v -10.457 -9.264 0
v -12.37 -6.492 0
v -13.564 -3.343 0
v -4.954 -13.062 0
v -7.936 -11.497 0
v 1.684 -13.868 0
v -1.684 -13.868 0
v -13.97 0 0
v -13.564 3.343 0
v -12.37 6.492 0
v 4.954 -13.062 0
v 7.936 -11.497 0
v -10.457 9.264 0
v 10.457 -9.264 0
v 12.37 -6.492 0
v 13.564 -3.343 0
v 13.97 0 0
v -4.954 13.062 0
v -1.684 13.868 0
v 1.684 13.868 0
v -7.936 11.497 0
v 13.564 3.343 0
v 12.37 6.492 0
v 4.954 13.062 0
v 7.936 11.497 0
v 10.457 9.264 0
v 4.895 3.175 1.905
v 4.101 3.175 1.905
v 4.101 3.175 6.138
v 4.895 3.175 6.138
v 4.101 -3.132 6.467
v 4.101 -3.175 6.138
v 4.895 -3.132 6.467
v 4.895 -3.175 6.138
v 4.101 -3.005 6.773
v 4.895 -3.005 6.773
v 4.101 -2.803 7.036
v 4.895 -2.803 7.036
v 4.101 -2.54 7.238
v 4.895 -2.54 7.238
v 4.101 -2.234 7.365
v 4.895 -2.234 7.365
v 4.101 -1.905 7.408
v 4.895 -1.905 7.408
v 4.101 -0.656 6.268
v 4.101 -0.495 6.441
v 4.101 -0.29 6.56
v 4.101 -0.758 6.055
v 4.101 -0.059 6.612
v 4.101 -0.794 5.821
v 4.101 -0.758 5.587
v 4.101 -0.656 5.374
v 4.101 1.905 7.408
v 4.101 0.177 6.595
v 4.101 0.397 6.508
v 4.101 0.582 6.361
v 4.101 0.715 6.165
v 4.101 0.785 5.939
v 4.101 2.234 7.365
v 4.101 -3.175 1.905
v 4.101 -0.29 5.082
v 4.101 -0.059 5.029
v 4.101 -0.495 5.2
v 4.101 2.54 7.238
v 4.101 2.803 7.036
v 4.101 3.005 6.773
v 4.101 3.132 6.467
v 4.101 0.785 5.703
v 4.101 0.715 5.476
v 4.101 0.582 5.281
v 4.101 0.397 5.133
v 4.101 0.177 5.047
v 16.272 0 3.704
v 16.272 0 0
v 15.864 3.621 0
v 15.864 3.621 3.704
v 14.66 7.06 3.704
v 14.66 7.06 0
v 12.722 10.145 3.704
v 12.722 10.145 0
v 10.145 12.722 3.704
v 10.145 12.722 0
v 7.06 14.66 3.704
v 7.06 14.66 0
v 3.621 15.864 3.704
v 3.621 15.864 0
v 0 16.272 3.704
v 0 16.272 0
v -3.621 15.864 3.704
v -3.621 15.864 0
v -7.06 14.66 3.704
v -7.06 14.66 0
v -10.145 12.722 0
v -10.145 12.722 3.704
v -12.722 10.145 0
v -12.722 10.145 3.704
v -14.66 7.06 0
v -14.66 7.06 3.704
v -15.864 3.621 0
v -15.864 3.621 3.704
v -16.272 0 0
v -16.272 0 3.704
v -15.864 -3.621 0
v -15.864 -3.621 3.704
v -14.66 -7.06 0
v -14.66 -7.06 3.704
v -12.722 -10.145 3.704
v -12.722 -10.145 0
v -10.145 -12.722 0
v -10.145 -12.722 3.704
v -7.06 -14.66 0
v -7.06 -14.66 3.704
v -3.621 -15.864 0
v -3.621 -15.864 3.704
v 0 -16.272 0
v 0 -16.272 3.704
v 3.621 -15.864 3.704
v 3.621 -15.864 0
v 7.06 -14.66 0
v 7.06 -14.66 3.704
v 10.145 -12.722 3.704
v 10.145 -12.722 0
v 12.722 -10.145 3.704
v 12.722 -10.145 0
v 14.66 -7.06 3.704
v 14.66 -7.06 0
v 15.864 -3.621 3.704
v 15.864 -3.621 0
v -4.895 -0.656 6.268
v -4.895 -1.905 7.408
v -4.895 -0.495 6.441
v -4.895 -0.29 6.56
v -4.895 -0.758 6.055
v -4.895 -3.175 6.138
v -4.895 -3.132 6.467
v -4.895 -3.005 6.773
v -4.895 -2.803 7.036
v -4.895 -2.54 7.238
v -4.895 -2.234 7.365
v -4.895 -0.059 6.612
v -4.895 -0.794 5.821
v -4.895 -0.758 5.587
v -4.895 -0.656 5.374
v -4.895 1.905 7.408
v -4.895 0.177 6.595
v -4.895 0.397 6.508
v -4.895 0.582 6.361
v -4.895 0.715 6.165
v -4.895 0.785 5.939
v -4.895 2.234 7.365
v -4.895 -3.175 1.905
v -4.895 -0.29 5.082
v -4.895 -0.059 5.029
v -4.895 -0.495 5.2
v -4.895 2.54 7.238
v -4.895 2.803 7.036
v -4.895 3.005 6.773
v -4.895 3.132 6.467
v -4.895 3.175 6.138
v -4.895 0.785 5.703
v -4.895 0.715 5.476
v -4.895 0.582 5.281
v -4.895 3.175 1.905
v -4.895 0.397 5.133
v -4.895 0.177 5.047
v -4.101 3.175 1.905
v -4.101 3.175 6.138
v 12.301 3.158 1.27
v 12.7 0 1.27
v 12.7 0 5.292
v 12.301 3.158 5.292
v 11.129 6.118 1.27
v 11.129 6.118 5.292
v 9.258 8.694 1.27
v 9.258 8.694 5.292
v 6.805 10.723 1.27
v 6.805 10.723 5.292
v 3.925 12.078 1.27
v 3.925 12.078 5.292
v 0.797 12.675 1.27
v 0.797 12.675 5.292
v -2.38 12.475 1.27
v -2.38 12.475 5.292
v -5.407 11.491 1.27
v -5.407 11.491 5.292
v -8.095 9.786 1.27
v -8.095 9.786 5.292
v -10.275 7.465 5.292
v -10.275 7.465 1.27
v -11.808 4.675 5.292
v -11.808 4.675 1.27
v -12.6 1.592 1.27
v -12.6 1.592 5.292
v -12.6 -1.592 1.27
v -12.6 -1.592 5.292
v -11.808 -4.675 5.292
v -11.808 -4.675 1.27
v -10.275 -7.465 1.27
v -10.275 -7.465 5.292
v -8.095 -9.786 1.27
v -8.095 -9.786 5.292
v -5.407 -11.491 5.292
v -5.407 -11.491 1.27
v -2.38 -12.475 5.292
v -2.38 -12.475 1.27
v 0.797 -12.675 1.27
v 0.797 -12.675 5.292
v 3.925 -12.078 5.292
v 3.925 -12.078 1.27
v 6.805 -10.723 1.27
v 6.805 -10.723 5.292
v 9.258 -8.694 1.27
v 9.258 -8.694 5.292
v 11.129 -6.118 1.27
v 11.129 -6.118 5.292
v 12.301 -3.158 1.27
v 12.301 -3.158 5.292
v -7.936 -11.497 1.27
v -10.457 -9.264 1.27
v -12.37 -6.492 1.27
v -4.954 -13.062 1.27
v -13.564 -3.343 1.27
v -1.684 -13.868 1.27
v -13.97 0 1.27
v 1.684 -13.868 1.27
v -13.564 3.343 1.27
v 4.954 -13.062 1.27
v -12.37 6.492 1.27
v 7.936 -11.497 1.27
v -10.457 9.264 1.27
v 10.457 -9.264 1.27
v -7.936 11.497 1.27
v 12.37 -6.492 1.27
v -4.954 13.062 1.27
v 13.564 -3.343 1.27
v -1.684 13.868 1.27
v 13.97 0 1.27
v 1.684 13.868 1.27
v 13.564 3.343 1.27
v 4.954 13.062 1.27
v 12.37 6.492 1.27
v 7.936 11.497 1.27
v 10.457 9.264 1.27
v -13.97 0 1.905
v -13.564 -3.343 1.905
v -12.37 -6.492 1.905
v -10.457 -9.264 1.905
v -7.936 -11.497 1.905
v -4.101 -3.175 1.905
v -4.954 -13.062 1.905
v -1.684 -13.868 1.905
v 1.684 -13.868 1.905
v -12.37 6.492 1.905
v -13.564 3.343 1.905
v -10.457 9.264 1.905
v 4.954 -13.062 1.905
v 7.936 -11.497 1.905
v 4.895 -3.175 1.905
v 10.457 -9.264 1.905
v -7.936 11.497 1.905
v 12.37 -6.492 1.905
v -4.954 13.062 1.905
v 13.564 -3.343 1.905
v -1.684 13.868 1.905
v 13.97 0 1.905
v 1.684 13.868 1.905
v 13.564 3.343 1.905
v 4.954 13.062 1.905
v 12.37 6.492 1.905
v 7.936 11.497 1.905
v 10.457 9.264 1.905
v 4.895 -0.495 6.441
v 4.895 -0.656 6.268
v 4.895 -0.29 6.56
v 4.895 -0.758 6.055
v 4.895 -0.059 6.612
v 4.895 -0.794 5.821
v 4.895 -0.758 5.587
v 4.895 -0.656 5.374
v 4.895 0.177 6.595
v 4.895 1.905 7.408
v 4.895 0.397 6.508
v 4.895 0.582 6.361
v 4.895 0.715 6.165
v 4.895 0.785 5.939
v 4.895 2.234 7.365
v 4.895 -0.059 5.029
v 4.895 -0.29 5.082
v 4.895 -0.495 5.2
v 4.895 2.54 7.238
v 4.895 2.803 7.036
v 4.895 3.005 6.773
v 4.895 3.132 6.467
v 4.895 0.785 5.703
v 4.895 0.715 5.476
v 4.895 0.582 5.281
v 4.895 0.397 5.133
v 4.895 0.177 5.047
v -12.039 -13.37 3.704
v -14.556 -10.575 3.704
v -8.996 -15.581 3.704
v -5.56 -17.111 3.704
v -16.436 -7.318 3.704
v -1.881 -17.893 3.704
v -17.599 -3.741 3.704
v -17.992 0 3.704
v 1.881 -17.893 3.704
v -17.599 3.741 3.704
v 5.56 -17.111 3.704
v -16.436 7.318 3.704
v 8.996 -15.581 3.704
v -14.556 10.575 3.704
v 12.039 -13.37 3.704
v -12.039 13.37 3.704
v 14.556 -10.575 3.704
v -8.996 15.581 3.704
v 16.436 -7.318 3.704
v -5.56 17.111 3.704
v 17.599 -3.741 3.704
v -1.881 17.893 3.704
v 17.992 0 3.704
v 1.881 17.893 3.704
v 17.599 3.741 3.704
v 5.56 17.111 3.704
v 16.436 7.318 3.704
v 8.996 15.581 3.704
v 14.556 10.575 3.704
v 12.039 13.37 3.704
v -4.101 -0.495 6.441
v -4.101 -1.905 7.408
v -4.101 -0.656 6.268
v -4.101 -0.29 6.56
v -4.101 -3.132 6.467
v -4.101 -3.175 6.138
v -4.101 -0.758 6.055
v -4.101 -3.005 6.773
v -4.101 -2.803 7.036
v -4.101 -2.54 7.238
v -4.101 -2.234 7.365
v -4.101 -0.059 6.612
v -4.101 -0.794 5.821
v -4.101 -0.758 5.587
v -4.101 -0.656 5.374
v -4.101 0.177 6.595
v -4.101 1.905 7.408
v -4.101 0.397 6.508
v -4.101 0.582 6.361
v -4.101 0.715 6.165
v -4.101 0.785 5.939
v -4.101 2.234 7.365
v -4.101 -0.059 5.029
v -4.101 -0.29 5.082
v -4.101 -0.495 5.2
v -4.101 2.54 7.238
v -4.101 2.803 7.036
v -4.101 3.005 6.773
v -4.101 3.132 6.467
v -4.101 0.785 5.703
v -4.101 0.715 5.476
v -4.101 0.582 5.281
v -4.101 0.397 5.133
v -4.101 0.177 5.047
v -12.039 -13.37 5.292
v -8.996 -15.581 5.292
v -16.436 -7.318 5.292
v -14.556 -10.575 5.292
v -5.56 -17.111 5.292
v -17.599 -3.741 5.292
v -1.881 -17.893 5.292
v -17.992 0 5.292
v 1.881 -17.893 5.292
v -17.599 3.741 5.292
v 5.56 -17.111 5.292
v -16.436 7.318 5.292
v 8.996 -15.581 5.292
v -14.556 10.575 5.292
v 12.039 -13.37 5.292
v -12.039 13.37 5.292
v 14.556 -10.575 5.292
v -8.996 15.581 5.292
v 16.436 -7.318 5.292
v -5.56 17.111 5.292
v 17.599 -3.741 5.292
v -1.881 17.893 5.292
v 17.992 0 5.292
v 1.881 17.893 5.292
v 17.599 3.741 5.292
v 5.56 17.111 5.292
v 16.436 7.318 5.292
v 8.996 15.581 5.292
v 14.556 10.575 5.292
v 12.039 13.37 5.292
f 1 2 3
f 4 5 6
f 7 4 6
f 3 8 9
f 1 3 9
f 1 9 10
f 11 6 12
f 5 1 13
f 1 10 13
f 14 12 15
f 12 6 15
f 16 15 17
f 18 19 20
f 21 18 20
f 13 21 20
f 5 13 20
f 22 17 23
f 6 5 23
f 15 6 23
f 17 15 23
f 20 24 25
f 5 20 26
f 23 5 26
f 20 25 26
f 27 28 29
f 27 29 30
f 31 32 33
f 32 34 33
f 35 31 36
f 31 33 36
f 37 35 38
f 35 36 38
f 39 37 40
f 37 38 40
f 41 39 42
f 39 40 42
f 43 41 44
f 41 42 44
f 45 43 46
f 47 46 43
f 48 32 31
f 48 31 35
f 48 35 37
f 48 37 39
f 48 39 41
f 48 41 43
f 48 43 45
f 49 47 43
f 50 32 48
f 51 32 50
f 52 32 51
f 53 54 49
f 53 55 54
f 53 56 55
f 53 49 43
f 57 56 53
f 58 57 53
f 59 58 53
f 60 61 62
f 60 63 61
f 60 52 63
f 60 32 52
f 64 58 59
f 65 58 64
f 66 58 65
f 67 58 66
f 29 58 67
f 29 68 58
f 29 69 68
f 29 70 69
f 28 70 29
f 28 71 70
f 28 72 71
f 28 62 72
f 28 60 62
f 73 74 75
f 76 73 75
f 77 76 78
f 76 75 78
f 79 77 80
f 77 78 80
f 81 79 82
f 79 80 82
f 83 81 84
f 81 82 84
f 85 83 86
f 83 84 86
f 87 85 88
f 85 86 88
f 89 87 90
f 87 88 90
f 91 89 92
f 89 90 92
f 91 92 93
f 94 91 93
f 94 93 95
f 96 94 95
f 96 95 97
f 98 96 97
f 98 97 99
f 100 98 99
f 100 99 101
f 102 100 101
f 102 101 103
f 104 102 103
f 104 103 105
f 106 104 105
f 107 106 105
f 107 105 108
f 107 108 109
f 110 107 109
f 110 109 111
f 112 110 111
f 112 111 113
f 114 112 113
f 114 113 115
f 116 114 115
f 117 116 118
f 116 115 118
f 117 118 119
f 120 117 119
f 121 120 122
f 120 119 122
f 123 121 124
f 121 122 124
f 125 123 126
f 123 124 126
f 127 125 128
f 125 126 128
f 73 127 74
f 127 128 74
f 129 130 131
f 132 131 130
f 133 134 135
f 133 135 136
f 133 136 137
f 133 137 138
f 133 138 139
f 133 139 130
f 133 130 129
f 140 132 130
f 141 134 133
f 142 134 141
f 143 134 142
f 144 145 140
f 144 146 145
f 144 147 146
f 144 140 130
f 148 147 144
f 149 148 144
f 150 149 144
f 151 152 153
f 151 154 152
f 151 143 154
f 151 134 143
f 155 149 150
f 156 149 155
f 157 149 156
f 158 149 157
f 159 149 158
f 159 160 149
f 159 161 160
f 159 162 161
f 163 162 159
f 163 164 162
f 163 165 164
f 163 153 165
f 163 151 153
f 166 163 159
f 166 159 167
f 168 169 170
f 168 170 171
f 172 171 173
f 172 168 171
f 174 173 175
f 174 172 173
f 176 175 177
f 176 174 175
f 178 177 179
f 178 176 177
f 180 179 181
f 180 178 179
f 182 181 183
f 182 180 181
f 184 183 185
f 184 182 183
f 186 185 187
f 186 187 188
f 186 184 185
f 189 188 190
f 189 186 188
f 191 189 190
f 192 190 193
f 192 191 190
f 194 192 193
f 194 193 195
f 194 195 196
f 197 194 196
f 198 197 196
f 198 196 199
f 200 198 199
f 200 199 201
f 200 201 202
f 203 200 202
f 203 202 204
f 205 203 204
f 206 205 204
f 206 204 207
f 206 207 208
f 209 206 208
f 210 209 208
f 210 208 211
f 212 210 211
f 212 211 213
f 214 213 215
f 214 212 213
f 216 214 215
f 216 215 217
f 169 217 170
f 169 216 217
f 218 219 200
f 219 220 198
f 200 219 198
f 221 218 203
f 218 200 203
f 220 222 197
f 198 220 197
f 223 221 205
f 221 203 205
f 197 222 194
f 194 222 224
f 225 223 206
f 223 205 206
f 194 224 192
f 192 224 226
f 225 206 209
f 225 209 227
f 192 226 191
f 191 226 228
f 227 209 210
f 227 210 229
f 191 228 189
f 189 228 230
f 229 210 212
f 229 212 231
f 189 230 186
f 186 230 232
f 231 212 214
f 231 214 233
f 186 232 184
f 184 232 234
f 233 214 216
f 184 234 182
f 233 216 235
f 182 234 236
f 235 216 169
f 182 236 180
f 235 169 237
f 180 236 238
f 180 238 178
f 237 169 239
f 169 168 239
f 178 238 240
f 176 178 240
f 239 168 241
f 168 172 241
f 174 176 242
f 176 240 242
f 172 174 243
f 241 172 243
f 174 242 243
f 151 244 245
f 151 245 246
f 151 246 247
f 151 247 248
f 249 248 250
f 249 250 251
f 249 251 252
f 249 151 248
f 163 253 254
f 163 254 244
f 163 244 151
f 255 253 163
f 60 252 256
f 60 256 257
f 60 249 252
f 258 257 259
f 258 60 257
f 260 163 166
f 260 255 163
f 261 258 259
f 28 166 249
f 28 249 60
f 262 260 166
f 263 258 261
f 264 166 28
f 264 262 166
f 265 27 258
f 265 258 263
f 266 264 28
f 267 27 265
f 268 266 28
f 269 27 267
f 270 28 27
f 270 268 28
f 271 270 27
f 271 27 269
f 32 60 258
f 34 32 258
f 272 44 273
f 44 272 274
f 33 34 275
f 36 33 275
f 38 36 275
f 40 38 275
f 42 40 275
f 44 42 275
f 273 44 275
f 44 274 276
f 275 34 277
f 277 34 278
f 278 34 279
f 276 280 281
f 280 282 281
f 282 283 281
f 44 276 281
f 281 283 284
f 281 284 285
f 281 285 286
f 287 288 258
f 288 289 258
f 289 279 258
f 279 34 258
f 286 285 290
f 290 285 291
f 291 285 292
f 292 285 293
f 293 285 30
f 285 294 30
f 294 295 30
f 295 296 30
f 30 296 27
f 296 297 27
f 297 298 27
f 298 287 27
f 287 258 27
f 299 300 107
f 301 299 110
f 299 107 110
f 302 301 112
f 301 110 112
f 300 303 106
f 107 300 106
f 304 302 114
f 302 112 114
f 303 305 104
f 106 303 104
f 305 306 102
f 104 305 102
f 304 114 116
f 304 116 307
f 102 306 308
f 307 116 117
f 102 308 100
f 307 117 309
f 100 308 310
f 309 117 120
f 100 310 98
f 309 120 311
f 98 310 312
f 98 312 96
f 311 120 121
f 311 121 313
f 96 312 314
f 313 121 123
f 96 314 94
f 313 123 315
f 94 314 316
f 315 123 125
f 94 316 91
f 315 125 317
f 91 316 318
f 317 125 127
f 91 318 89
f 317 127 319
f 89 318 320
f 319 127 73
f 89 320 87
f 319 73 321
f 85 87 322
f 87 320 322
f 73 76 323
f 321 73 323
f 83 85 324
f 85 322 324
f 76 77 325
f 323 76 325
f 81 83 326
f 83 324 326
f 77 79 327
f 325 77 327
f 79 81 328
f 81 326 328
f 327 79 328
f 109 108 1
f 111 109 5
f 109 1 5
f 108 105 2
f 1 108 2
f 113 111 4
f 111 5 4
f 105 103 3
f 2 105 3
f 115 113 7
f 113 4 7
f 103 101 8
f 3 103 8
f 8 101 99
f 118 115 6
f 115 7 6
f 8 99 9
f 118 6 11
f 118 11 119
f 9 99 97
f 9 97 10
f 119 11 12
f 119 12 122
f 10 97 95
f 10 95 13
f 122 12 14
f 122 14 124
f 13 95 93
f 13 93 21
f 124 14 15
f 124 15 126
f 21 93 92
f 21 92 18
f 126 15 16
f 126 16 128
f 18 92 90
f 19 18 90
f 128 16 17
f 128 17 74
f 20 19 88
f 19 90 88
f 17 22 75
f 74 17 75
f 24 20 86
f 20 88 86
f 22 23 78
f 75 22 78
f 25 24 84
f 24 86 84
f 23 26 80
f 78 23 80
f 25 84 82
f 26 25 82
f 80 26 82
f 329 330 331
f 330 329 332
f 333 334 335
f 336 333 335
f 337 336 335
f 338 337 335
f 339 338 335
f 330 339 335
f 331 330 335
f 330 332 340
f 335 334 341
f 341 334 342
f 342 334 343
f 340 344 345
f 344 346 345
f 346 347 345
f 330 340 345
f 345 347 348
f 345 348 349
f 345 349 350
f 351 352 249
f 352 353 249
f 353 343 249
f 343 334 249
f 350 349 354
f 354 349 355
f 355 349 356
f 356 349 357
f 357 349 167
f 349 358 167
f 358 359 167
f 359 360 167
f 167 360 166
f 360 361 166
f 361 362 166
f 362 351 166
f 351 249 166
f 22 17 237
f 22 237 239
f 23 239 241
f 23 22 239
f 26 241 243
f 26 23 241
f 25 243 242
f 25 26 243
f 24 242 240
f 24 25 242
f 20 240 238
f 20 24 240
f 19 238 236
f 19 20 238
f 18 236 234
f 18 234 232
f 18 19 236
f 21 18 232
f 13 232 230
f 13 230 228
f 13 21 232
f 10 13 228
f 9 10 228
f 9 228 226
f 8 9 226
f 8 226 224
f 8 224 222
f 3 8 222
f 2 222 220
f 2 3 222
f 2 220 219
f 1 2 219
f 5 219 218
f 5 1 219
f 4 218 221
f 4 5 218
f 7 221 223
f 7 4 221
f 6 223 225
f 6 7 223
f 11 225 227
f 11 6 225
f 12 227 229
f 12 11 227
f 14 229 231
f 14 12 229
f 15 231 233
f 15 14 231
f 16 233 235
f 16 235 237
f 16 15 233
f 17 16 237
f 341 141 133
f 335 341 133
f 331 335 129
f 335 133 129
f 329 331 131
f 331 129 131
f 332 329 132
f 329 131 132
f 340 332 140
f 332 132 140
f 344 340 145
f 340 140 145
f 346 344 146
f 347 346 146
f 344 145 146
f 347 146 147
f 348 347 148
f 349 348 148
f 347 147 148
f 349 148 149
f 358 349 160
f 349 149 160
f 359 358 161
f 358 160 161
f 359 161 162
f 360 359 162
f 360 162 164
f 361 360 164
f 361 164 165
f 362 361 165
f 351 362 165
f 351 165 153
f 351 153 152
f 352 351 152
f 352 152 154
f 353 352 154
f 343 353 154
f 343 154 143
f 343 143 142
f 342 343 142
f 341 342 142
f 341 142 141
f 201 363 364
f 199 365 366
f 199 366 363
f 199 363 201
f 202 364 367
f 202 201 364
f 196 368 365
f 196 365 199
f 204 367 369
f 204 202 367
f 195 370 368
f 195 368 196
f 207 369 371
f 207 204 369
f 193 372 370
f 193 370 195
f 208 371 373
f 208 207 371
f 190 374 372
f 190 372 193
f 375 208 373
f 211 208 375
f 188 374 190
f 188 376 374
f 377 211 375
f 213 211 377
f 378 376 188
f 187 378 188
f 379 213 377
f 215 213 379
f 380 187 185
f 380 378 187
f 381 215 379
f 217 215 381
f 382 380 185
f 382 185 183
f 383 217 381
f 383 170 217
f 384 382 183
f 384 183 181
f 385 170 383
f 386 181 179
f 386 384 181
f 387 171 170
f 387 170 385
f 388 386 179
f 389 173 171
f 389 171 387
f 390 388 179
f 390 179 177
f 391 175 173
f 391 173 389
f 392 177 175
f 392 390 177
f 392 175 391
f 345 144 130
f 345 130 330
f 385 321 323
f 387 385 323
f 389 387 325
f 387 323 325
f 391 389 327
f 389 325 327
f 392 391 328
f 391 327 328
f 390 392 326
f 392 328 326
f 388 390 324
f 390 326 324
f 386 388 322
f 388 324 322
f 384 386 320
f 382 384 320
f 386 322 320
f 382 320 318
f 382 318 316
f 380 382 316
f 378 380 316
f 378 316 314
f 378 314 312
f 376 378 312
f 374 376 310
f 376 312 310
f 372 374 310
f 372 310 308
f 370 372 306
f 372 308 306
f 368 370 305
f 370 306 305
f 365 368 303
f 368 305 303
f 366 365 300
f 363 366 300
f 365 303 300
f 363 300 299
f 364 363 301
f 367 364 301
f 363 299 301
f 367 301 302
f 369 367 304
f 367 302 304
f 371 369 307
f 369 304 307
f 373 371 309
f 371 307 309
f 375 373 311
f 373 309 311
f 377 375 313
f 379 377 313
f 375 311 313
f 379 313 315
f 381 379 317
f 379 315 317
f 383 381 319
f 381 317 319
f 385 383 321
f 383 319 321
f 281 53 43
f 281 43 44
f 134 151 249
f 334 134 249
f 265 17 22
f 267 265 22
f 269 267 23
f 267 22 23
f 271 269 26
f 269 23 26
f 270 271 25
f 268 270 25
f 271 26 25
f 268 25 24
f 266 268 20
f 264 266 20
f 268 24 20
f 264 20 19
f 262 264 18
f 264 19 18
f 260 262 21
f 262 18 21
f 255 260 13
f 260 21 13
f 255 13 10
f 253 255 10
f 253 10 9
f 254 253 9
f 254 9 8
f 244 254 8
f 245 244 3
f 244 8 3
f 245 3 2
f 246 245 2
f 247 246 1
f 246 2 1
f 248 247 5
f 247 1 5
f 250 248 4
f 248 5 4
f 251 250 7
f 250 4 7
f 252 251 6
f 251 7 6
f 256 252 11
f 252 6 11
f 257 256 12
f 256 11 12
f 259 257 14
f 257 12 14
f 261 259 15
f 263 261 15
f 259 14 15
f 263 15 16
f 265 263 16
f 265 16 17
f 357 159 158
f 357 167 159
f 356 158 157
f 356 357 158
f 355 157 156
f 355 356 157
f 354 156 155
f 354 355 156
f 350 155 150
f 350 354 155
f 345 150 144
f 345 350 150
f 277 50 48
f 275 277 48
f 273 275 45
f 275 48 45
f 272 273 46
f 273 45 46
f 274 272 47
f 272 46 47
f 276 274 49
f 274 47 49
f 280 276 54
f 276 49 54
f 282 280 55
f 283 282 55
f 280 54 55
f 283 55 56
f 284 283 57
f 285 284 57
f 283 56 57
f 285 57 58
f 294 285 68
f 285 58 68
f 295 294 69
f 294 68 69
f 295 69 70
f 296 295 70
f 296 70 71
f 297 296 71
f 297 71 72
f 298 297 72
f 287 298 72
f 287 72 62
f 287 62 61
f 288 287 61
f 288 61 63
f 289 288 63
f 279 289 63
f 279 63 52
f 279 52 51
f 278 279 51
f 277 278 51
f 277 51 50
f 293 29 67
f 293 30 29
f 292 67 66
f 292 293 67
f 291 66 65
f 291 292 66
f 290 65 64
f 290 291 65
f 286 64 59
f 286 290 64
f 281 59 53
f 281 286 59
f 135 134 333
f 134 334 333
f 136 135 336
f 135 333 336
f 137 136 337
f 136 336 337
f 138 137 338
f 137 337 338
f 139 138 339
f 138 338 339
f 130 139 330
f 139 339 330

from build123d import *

# Parameters (mm, degrees)
F0_R      = 16.271875
F0_R_2    = 12.7
F1_DEPTH  = 5.2916666667
F2_START  = 3.7041666667
F0_R_3    = 17.9916666667
F2_DEPTH  = 1.5875
F3_R      = 13.97
F4_DEPTH  = 1.905
F5_DEPTH  = 1.27
F6_W      = 0.79375
F6_H      = 6.35
F7_DEPTH  = 7.4083333333
F8_R      = 1.27
F9_R      = 0.79375
F10_DEPTH = 25.4


with BuildPart() as f1:
    # F0 (on Top) → F1 (new body)
    with BuildSketch(Plane.XY):
        Circle(F0_R)
        Circle(F0_R_2, mode=Mode.SUBTRACT)
    extrude(amount=F1_DEPTH)

    # F0 (on Top) → F2 (join)
    with BuildSketch(Plane.XY.offset(F2_START)):
        Circle(F0_R_3)
        Circle(F0_R, mode=Mode.SUBTRACT)
    extrude(amount=F2_DEPTH)

    # F3 (on Top) → F5 (cut)
    with BuildSketch(Plane.XY):
        Circle(F3_R)
    extrude(amount=F5_DEPTH, mode=Mode.SUBTRACT)


with BuildPart() as f4:
    # F3 (on Top) → F4 (new body)
    with BuildSketch(Plane.XY):
        Circle(F3_R)
    extrude(amount=F4_DEPTH)

    # F6 (on Top) → F7 (join)
    with BuildSketch(Plane.XY):
        with Locations((-4.4979166667, 0)):
            Rectangle(F6_W, F6_H)
        with Locations((4.4979166667, 0)):
            Rectangle(F6_W, F6_H)
    extrude(amount=F7_DEPTH)

    # F8
    f8_edges = [f4.edges().sort_by_distance(p)[0] for p in [
        (-4.497917, -3.175, 7.408333),
        (4.497917, -3.175, 7.408333),
        (4.497917, 3.175, 7.408333),
        (-4.497917, 3.175, 7.408333),
    ]]
    fillet(f8_edges, radius=F8_R)

    # F9 (on face) → F10 (cut)
    with BuildSketch(Plane(origin=(-4.8947916667, 0, 0), x_dir=(0, -1, 0), z_dir=(-1, 0, 0))):
        with Locations((0, 5.8208333333)):
            Circle(F9_R)
    extrude(amount=-F10_DEPTH, mode=Mode.SUBTRACT)


solid = Compound([f1.part, f4.part])
